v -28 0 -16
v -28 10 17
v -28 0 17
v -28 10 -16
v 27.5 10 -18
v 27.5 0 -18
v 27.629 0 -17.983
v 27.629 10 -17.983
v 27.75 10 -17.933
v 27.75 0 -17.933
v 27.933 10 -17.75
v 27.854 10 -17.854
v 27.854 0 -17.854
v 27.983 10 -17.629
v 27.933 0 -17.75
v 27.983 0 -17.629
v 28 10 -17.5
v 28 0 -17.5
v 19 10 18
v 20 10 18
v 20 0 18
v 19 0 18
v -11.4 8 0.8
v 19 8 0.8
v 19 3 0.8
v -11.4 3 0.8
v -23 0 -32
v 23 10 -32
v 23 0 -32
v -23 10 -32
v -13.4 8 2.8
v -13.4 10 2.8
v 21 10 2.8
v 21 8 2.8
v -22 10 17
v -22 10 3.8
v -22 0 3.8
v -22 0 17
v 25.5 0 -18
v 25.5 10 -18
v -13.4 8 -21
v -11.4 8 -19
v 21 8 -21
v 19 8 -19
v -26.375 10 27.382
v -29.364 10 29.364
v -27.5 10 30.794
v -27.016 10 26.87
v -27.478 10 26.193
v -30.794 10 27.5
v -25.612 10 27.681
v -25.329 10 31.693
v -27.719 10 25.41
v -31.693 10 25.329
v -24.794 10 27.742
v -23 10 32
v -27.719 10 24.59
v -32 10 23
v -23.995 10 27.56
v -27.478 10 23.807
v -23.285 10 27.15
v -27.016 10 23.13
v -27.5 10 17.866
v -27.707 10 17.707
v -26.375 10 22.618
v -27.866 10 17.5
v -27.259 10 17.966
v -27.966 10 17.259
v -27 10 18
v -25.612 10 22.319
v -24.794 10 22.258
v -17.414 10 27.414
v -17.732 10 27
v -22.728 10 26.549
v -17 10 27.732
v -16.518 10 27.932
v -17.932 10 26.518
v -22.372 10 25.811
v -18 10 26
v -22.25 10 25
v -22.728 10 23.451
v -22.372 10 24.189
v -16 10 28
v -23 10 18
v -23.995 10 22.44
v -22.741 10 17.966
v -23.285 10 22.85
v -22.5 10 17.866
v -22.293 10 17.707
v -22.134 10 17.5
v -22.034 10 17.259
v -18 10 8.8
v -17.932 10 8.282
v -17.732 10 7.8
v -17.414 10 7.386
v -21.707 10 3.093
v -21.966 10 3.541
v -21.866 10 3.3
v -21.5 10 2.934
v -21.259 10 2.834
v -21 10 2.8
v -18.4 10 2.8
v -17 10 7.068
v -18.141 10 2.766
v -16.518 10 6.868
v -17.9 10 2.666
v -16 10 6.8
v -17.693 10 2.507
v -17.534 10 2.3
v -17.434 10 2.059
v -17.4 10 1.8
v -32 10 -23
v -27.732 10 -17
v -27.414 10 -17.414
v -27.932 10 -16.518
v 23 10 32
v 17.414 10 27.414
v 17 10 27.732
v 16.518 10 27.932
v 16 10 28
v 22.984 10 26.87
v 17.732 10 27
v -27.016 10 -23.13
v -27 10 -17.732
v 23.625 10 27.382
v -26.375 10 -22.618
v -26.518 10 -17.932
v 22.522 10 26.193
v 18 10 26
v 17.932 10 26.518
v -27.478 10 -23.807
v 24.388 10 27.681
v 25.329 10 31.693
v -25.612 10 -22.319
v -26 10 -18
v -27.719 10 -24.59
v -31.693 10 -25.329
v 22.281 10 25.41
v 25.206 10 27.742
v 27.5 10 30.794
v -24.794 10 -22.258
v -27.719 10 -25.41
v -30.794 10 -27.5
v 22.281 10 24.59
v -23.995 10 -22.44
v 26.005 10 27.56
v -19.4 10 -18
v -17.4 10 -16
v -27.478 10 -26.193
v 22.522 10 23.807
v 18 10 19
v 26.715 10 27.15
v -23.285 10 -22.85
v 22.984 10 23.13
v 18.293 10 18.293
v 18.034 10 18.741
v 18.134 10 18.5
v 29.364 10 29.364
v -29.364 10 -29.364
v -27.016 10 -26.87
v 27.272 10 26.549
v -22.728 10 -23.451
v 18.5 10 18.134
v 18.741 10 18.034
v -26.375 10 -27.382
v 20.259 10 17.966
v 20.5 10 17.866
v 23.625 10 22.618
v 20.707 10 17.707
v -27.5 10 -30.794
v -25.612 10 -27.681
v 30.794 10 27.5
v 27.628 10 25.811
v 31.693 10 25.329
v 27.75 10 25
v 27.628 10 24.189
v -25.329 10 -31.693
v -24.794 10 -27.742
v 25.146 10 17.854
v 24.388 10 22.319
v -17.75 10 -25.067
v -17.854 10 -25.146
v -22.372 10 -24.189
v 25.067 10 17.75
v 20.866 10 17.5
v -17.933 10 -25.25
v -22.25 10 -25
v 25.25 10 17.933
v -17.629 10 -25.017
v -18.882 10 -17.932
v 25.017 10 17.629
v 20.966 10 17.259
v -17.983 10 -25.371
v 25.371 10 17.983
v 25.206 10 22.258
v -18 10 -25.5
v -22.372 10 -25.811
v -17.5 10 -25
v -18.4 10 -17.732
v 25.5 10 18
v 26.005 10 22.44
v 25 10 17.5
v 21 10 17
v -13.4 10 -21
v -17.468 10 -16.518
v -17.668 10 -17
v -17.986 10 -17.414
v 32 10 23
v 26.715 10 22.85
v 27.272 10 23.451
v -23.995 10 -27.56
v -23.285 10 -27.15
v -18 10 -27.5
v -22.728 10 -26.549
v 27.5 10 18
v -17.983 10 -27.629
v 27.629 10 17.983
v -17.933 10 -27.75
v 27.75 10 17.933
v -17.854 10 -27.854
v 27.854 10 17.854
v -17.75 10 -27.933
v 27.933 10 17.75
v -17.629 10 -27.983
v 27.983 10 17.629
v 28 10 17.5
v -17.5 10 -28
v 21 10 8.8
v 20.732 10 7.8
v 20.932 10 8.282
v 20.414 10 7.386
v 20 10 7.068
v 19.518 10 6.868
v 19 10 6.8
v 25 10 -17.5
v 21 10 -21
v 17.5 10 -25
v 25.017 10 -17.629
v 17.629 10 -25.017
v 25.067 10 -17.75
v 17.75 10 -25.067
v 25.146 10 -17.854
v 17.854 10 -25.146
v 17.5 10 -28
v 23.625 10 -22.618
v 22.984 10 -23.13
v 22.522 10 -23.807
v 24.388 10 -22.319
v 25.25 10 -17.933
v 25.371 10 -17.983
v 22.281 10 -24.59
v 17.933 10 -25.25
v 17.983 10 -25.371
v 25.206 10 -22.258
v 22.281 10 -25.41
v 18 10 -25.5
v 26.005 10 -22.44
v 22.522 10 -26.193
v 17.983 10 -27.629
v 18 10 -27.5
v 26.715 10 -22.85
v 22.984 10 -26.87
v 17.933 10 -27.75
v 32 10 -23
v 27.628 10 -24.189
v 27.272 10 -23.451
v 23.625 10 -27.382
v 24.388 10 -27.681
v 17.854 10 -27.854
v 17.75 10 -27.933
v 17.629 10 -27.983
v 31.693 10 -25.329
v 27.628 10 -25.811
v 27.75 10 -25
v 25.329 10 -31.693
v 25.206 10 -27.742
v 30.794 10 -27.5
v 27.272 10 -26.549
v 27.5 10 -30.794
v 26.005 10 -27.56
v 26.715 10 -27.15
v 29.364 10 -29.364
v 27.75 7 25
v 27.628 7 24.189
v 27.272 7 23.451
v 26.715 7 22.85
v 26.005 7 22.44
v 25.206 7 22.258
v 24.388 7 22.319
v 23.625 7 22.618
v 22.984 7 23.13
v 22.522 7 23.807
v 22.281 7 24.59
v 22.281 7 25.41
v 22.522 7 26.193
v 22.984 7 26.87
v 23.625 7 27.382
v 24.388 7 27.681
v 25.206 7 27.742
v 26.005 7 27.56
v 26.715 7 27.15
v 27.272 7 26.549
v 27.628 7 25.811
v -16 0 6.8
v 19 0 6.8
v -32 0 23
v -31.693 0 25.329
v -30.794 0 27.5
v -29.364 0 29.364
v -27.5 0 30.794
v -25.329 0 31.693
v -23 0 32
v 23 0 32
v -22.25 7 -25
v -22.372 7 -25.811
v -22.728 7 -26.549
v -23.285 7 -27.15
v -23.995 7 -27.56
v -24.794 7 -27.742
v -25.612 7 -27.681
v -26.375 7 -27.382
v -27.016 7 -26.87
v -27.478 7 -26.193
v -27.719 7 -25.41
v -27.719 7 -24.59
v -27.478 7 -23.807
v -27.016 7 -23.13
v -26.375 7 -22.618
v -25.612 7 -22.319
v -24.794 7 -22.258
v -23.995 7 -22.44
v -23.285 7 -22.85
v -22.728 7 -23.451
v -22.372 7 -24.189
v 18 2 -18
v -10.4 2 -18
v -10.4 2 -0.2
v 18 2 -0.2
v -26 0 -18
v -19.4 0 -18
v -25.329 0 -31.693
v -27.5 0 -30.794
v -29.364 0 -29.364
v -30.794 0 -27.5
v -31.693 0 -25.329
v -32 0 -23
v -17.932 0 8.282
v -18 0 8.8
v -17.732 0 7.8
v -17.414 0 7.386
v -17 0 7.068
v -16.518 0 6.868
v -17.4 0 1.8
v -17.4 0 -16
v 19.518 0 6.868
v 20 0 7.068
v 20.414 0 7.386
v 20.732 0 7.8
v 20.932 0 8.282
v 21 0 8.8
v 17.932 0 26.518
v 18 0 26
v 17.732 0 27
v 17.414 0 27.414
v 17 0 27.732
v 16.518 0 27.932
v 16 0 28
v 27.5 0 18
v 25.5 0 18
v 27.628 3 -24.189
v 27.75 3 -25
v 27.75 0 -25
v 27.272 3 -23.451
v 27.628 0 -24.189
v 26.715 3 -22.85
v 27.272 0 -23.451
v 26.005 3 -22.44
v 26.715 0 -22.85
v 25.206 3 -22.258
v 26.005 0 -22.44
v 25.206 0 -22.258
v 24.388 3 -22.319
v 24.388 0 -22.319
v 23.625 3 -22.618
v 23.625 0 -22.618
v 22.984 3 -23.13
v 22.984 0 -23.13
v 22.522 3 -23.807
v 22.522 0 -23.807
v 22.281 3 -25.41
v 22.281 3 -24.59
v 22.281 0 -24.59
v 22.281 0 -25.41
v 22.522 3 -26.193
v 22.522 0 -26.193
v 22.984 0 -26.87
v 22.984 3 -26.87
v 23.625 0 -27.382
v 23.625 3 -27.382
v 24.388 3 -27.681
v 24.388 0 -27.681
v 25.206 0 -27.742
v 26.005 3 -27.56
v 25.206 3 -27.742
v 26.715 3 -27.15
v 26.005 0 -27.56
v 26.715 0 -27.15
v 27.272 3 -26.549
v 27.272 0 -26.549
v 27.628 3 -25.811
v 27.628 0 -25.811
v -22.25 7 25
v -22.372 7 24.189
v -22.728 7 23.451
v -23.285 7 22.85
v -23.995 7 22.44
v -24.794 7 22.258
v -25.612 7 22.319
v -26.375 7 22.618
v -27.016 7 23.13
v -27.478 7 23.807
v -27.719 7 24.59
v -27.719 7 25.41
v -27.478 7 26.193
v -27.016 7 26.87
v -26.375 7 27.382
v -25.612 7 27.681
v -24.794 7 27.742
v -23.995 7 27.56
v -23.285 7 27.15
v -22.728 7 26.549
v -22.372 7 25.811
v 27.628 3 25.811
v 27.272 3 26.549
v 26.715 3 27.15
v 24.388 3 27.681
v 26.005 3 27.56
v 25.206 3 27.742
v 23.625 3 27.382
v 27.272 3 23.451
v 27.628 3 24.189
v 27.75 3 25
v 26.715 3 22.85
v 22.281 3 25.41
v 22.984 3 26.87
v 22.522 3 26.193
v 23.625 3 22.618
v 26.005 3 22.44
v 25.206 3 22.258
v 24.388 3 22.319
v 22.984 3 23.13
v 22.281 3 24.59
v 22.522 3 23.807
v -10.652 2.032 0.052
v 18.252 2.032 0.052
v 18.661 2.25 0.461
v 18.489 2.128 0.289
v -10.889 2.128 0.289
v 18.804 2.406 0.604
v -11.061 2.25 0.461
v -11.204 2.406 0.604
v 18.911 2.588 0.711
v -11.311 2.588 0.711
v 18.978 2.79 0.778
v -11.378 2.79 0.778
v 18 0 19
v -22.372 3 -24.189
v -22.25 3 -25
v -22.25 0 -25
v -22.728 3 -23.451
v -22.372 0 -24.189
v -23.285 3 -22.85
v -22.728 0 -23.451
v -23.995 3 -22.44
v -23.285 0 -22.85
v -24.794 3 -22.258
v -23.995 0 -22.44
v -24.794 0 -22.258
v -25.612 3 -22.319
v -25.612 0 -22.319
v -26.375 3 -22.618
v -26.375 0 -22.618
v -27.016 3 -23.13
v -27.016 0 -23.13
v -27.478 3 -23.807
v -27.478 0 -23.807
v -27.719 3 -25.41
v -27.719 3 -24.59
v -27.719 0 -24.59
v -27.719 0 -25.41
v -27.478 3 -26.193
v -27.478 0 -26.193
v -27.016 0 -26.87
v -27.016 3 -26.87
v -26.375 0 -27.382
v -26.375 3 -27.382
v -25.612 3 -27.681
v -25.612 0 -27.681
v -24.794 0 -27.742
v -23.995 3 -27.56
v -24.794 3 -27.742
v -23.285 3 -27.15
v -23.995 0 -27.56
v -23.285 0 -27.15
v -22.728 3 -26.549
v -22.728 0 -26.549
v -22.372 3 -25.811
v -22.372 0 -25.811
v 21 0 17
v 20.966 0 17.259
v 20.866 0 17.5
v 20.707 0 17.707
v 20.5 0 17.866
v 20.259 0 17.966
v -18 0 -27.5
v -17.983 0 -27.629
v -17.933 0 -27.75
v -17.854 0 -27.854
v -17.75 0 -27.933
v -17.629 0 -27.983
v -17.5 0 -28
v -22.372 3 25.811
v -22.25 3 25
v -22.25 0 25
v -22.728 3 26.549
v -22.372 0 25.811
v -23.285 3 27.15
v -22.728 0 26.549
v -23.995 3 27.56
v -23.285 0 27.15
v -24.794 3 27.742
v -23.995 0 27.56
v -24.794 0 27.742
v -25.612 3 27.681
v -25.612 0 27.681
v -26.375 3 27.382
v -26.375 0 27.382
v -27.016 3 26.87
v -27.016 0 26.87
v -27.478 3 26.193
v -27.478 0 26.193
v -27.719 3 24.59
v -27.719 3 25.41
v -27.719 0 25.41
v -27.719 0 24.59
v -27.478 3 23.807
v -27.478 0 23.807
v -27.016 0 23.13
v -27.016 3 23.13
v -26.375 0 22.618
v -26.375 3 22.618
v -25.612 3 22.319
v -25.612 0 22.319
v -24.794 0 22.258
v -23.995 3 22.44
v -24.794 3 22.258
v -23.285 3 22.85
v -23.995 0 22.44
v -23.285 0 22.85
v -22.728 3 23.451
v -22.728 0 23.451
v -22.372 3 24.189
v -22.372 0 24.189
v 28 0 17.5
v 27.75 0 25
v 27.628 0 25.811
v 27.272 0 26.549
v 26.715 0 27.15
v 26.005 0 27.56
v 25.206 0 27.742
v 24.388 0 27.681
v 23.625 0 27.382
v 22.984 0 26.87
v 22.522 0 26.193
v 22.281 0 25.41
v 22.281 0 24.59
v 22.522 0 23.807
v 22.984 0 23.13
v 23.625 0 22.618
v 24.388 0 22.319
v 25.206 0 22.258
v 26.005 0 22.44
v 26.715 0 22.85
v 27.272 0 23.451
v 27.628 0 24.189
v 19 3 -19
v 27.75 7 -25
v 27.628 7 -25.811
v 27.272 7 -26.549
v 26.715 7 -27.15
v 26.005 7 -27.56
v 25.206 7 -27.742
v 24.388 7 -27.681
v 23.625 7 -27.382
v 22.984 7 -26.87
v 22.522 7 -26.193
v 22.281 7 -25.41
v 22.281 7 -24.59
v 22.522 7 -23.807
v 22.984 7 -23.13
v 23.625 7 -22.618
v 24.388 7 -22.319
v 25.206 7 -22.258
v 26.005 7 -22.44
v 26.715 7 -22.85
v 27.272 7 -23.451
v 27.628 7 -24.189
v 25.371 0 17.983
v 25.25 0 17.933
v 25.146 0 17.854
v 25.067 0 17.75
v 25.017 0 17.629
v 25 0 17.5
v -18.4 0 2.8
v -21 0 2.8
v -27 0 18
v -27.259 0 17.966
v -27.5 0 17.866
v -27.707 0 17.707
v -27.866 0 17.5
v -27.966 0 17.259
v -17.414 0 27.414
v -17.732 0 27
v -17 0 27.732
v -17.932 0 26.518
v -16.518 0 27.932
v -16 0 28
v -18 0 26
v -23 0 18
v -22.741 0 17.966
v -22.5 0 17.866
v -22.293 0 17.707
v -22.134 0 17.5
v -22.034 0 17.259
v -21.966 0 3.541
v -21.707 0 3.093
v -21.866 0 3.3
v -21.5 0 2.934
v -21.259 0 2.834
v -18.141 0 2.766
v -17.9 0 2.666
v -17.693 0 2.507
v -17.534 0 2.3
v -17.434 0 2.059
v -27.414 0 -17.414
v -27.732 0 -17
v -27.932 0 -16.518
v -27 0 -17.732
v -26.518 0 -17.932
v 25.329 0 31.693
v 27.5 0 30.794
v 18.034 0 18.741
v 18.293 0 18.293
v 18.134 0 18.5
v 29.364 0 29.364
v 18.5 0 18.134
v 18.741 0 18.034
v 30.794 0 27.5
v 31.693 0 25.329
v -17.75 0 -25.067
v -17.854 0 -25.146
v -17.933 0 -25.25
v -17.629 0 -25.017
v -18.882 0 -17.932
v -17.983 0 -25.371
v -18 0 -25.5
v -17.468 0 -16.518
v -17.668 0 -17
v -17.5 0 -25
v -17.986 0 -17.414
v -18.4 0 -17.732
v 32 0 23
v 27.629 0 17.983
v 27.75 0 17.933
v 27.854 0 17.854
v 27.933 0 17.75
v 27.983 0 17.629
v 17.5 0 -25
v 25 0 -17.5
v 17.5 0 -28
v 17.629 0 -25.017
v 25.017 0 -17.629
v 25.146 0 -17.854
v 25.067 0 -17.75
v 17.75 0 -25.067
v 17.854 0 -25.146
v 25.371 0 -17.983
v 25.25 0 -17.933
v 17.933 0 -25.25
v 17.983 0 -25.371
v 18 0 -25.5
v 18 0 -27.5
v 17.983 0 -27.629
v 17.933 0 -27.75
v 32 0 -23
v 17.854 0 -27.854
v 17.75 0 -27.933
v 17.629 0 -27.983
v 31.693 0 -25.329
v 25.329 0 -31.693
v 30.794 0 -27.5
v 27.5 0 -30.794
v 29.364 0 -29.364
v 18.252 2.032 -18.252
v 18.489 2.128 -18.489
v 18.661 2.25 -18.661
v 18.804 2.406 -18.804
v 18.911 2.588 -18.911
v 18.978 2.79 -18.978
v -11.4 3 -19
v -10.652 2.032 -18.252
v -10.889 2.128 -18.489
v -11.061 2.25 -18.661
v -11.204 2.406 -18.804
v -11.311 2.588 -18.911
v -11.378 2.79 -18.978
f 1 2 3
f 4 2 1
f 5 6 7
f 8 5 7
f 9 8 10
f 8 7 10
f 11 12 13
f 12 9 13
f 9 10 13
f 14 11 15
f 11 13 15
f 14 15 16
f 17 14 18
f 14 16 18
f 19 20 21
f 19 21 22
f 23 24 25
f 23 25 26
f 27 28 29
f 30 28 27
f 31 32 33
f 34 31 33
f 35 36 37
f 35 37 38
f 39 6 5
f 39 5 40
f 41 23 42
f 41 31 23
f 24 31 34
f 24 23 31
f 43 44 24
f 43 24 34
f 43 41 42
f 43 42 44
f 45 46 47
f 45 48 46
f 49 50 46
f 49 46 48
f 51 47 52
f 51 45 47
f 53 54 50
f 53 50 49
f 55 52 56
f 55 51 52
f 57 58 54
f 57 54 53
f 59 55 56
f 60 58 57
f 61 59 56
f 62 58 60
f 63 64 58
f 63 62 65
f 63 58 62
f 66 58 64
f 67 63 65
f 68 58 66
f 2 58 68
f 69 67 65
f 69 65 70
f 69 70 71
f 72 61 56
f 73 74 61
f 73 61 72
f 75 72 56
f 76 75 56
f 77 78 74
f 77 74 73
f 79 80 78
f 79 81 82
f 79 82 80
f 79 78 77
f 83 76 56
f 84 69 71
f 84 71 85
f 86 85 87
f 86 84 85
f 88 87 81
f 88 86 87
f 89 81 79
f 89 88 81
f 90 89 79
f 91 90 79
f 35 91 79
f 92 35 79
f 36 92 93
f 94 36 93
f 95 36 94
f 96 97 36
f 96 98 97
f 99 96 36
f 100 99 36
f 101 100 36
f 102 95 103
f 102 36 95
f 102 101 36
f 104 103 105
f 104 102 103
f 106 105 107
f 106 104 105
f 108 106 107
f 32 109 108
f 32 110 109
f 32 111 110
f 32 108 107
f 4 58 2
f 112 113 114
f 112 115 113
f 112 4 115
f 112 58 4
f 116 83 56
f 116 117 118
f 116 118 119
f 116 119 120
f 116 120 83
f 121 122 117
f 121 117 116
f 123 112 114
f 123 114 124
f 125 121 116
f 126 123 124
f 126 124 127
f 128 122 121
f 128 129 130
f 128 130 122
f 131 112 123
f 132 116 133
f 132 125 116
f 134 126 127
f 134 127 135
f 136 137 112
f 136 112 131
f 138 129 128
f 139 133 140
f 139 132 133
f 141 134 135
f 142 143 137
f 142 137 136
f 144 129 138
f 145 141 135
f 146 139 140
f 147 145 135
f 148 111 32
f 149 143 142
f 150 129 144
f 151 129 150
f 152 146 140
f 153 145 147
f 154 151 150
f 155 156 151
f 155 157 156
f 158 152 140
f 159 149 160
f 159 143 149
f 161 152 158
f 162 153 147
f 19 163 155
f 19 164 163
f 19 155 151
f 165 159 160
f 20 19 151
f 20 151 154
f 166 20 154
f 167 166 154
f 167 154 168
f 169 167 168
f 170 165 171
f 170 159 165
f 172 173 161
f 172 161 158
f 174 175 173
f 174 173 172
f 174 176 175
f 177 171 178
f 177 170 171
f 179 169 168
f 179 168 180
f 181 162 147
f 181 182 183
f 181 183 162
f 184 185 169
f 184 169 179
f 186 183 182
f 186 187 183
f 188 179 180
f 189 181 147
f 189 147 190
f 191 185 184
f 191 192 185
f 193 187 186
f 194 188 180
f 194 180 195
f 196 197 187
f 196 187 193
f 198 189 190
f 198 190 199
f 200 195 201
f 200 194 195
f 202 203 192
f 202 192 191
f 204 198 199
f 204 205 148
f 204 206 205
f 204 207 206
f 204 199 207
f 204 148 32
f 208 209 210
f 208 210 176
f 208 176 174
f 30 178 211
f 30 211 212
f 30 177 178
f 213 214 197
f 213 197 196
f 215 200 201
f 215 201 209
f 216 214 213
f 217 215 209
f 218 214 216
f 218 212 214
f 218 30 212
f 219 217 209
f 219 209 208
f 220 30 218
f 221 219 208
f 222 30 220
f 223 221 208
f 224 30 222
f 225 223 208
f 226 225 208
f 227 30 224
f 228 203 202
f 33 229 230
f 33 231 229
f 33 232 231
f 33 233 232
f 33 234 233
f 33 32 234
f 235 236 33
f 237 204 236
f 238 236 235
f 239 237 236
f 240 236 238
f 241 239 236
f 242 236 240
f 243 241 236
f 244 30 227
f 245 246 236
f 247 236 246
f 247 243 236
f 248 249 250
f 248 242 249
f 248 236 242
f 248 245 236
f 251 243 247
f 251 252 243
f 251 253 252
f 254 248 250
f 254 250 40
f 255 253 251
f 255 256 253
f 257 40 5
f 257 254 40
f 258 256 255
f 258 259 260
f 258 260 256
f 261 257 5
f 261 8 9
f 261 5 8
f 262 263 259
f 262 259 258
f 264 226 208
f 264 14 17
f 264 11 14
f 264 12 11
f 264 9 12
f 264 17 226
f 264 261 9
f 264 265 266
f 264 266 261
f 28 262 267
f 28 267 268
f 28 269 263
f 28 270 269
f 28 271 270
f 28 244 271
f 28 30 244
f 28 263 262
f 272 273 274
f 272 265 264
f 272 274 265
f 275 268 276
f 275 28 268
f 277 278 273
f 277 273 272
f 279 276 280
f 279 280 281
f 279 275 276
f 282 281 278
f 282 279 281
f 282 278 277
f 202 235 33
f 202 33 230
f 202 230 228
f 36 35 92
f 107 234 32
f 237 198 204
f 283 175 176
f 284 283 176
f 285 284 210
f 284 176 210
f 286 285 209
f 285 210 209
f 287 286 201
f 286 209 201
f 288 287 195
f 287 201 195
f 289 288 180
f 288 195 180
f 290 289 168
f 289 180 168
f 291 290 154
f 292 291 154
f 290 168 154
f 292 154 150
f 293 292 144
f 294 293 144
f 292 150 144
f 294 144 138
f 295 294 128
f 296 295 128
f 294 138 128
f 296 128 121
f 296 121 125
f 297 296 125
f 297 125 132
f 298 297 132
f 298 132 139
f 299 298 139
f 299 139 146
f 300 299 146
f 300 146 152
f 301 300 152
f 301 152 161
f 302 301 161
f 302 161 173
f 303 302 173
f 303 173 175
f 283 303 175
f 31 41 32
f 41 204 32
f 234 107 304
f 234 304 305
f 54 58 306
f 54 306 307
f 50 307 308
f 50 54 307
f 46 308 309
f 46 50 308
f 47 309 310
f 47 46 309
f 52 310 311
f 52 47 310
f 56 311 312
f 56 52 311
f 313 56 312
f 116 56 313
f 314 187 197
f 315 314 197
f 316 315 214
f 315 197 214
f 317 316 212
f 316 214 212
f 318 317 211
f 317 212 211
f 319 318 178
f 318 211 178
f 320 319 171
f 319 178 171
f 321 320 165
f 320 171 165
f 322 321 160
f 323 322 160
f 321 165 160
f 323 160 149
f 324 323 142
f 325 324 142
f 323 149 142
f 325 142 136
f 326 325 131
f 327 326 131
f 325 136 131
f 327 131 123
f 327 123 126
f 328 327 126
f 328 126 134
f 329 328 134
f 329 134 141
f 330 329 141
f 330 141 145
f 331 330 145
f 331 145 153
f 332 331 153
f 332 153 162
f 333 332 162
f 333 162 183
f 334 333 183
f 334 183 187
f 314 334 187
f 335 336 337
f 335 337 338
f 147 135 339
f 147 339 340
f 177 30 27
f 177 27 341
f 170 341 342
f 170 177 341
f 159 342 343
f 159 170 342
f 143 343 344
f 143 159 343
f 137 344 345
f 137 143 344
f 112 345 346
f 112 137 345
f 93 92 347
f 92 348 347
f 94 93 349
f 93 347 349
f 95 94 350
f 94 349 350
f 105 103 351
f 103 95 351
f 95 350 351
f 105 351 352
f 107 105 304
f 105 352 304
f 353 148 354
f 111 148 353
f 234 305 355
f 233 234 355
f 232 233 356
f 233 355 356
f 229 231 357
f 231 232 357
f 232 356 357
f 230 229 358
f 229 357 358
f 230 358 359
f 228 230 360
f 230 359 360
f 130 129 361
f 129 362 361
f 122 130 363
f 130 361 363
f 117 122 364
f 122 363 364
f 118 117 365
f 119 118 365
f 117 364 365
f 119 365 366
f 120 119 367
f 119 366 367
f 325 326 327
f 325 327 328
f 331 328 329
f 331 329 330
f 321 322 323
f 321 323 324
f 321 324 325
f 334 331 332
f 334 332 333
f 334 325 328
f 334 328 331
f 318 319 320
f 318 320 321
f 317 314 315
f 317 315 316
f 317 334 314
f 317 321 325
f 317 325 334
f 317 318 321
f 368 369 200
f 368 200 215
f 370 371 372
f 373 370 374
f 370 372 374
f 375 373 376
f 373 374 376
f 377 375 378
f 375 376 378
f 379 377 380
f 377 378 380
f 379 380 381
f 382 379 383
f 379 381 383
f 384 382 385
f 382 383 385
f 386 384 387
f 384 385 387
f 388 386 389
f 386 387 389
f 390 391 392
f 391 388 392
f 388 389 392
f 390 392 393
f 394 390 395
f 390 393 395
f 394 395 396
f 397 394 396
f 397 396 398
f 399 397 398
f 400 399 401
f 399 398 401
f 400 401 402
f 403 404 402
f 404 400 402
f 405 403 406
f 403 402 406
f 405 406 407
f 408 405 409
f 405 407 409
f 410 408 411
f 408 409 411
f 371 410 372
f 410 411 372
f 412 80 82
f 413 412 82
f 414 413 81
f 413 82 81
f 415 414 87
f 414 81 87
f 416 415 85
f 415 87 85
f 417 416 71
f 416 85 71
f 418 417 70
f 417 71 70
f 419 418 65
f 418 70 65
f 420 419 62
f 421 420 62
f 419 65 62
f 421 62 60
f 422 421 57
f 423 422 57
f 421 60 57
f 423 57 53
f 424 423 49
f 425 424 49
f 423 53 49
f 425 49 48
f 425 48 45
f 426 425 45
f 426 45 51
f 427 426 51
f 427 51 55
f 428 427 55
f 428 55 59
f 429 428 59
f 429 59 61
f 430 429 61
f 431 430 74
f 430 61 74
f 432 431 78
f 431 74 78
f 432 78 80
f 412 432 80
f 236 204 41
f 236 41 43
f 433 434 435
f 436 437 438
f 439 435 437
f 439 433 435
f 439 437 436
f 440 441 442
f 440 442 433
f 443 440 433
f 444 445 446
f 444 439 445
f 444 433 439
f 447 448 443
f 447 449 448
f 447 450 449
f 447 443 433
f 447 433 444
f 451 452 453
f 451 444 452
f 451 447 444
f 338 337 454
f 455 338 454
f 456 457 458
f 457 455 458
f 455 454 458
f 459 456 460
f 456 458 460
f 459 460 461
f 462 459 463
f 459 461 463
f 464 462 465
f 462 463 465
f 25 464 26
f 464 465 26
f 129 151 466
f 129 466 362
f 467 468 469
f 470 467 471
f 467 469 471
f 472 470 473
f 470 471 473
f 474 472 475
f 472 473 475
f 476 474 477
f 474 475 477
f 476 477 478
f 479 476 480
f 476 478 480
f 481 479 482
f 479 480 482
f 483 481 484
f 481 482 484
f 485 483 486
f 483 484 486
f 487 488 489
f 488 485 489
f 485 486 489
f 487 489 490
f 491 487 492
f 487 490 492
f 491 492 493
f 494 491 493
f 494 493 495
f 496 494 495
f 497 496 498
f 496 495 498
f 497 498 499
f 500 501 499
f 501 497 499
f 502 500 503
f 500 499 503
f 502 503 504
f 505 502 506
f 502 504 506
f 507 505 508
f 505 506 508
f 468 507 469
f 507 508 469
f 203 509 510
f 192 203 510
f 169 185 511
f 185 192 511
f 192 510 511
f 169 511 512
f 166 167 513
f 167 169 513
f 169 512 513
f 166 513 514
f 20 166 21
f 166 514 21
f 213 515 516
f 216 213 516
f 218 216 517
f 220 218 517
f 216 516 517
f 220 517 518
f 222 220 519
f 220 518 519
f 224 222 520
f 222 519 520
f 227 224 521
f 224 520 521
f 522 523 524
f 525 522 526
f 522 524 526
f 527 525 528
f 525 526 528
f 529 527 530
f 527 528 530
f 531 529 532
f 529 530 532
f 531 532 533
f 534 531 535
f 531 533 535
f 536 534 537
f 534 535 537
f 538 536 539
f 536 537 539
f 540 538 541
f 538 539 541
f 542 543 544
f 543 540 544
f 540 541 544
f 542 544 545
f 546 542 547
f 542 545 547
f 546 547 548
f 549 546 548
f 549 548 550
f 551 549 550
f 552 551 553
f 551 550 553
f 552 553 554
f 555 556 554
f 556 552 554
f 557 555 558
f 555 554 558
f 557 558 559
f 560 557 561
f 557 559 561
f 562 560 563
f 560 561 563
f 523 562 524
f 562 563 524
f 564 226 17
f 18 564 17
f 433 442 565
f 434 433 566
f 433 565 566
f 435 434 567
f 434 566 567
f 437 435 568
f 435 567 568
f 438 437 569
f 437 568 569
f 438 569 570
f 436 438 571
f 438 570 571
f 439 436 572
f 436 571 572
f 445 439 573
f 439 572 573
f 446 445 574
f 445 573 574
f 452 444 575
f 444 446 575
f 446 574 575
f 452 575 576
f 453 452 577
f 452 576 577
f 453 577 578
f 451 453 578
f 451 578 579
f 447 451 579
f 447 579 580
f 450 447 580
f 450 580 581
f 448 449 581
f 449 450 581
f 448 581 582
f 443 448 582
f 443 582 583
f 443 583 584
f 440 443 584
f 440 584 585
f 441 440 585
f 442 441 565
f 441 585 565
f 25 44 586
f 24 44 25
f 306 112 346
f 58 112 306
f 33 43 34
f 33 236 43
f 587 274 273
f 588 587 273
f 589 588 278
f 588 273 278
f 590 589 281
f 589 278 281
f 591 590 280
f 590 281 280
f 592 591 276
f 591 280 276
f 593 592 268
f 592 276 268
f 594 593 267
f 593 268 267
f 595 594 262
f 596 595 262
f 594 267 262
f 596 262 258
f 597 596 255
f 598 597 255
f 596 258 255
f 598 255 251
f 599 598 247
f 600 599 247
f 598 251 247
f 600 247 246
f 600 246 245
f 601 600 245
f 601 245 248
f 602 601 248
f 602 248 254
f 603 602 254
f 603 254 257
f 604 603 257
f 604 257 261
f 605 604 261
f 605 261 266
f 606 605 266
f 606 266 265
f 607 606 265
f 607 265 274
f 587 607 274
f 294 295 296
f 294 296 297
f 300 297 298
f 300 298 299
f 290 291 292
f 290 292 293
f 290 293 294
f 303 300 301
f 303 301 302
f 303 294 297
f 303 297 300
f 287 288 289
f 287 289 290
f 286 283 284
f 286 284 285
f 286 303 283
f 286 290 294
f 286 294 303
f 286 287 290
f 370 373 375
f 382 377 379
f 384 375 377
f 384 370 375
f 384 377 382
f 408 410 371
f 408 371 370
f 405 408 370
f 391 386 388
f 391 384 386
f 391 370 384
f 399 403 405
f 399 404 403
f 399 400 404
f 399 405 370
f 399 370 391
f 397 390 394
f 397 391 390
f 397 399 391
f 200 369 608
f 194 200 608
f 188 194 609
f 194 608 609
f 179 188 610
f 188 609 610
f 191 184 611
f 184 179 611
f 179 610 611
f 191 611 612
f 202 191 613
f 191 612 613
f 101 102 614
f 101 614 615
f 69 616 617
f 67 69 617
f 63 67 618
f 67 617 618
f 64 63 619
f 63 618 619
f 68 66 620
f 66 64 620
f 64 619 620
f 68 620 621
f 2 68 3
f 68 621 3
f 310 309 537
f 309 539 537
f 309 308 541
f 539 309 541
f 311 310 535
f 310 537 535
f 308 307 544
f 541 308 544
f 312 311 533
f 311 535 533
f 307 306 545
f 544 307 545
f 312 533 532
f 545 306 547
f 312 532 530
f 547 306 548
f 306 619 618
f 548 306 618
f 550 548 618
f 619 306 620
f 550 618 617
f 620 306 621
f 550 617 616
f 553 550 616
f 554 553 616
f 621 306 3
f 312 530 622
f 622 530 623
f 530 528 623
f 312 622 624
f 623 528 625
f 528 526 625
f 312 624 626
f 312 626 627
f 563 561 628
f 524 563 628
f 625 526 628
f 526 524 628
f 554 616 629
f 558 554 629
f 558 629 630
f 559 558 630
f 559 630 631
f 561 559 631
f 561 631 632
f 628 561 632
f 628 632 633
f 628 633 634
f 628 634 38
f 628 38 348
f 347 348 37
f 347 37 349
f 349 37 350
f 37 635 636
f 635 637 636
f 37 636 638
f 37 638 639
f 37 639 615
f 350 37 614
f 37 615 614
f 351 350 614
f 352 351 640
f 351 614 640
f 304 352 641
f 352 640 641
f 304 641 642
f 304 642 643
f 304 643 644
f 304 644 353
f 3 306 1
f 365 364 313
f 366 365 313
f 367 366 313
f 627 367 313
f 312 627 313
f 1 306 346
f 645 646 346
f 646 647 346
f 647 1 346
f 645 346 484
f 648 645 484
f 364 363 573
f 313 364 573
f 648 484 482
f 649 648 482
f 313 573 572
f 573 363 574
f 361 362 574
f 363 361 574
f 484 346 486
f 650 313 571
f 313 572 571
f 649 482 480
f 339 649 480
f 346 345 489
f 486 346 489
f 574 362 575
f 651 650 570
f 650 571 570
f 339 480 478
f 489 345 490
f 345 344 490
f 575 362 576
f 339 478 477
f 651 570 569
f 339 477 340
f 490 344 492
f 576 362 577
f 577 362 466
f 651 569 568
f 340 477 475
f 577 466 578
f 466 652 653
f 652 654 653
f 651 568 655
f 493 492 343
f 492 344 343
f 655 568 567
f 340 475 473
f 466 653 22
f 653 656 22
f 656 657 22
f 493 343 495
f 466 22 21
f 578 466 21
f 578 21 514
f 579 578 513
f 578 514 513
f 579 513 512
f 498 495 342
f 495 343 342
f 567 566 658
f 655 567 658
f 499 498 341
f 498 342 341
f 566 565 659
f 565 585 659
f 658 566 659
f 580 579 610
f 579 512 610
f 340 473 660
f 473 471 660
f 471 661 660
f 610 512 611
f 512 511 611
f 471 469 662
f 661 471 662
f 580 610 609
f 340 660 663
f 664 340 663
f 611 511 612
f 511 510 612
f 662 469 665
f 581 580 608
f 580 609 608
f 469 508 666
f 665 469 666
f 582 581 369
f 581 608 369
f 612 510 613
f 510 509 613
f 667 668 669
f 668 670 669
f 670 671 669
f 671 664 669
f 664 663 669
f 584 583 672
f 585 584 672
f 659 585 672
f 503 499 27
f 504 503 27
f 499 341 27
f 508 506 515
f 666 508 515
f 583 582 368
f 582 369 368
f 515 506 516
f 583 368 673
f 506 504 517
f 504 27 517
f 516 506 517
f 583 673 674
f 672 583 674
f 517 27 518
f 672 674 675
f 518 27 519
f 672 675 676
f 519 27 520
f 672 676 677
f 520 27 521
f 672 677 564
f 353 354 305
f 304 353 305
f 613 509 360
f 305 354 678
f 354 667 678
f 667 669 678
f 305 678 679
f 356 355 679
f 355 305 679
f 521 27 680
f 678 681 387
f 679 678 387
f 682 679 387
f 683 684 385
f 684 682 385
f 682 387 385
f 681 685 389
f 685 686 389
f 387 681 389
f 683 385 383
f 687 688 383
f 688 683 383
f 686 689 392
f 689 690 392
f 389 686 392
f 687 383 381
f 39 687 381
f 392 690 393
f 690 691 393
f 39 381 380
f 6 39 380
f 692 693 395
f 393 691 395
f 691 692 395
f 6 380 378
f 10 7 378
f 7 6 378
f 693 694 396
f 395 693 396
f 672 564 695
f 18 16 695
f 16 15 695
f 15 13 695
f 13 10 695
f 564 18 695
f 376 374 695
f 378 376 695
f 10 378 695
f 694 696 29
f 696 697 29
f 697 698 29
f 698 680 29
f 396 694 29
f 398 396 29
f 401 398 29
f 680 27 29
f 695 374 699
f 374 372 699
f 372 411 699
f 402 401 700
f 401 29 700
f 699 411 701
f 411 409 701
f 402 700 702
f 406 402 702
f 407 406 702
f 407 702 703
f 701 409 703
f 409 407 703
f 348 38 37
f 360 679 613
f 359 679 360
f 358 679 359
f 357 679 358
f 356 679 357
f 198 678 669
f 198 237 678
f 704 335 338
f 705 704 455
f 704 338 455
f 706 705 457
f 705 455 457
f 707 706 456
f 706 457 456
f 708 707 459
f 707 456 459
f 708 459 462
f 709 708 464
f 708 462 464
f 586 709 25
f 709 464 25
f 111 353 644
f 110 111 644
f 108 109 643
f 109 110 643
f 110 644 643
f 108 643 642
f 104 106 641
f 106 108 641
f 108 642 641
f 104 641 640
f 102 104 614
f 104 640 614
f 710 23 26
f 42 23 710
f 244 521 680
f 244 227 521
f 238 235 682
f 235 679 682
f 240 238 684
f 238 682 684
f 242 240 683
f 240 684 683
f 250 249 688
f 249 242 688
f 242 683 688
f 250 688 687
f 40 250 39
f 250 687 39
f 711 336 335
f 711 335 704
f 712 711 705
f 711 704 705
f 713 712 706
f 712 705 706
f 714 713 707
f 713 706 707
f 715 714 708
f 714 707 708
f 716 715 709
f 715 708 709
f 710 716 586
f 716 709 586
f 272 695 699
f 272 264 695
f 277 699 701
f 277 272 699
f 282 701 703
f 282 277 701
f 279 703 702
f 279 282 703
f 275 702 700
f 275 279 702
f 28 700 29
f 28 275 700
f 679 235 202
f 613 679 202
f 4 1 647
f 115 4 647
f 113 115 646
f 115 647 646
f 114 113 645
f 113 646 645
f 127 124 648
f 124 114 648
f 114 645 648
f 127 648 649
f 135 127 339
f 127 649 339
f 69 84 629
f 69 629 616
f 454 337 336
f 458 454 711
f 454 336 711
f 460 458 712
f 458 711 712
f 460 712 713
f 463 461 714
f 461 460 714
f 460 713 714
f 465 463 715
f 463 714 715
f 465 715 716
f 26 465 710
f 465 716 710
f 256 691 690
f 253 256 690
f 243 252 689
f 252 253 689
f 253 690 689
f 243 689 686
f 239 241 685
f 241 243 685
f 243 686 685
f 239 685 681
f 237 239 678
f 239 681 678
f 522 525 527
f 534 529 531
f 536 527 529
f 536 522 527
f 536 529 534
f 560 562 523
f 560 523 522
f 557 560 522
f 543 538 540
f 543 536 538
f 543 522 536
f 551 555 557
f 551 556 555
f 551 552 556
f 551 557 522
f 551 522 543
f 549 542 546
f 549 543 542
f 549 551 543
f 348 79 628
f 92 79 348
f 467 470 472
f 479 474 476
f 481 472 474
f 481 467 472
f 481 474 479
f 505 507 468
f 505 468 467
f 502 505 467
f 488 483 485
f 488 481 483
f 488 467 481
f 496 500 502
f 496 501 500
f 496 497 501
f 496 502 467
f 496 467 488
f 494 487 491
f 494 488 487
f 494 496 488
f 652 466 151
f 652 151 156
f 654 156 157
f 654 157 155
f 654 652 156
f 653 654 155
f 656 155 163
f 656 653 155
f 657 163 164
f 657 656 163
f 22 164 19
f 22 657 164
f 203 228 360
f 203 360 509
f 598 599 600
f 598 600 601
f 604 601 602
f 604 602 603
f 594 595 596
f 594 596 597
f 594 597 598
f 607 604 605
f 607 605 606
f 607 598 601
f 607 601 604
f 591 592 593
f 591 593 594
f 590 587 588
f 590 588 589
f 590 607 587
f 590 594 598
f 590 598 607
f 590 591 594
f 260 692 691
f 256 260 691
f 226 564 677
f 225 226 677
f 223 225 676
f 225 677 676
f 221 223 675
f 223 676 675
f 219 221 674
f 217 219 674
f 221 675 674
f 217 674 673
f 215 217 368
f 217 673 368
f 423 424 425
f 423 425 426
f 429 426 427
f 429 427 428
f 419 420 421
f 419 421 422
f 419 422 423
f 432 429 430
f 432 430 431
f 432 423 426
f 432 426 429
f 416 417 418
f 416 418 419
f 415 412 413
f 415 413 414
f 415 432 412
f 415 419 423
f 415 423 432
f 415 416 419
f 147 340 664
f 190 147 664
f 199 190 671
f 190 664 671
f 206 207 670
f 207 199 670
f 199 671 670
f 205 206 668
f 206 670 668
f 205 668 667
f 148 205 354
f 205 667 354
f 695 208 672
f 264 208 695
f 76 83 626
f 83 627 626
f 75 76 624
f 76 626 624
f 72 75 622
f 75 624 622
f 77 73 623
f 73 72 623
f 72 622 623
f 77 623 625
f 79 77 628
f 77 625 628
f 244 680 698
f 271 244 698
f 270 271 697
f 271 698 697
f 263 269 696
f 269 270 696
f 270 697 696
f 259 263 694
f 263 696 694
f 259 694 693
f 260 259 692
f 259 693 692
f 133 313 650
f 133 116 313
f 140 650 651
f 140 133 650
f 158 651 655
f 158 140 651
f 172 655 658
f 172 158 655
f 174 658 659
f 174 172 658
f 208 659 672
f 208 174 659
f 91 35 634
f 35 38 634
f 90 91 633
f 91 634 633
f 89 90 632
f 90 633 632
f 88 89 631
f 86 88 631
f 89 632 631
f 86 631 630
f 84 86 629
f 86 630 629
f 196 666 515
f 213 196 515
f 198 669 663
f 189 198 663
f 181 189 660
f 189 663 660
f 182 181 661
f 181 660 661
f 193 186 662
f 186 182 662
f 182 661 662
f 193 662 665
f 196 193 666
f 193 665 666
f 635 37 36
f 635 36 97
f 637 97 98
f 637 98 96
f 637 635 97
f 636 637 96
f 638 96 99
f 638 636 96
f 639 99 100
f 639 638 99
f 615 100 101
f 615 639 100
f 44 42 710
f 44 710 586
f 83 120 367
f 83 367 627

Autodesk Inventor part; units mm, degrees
ref_plane "YZ Plane" through (0, 0, 0) normal (1, 0, 0) x (0, 1, 0)
ref_plane "XZ Plane" through (0, 0, 0) normal (0, 1, 0) x (-1, 0, 0)
sketch "Sketch1" plane through (0, 0, 0) normal (0, 1, 0) x (-1, 0, 0)
  line L0 (30, 30) -> (-30, 30)
  line L1 (-30, 30) -> (-30, -30)
  line L2 (-30, -30) -> (30, -30)
  line L3 (30, -30) -> (30, 30)
  line L4 (30, 30) -> (-30, -30) construction
  line L5 (-30, 30) -> (30, -30) construction
  point P0 (0, 0)
  dimension "d0" = 60
  dimension "d1" = 60
extrude "Extrusion1" add sketch "Sketch1" along normal blind 10
fillet "Fillet1" radius 7 4 edges at (30, 5, 30) (30, 5, -30) (-30, 5, 30) (-30, 5, -30)
sketch "Sketch2" plane through (0, 10, 0) normal (0, 1, 0) x (1, 0, 0)
  line L0 (-30, 30) -> (30, 30)
  line L1 (30, 30) -> (30, -30)
  line L2 (30, -30) -> (-30, -30)
  line L3 (-30, -30) -> (-30, 30)
  line L4 (-30, 30) -> (30, -30) construction
  line L5 (30, 30) -> (-30, -30) construction
  line L6 (25, -25) -> (25, 25)
  line L7 (25, 25) -> (-25, 25)
  line L8 (-25, 25) -> (-25, -25)
  line L9 (-25, -25) -> (25, -25)
  circle A0 centre (25, -25) radius 2.75
  circle A1 centre (-25, -25) radius 2.75
  circle A2 centre (25, 25) radius 2.75
  circle A3 centre (-25, 25) radius 2.75
  point P0 (0, 0)
  dimension "d5" = 5
  dimension "d6" = 5.5
  dimension "d7" = 5.5
  dimension "d8" = 5.5
  dimension "d9" = 5.5
extrude "Extrusion2" cut sketch "Sketch2" against normal blind 3 contours L9 A0 L6 | L6 A0 L9 | A2 L7 L6 | L6 L7 A2 | A1 L8 L9 | L9 L8 A1 | A3 L8 L7 | L7 L8 A3
sketch "Sketch7" plane through (0, 10, 0) normal (0, 1, 0) x (1, 0, 0)
  line L0 (-23, 30) -> (23, 30)
  line L1 (30, 23) -> (30, -23)
  line L2 (23, -30) -> (-23, -30)
  line L3 (-30, -23) -> (-30, 23)
  line L4 (-30, 30) -> (30, -30) construction
  line L5 (30, 30) -> (-30, -30) construction
  arc A0 (-23, 30) -> (-30, 23) centre (-23, 23) ccw
  arc A1 (-30, -23) -> (-23, -30) centre (-23, -23) ccw
  arc A2 (23, -30) -> (30, -23) centre (23, -23) ccw
  arc A3 (30, 23) -> (23, 30) centre (23, 23) ccw
  line L6 (23, 32) -> (-23, 32)
  arc A4 (-23, 32) -> (-32, 23) centre (-23, 23) ccw
  line L7 (-32, 23) -> (-32, -23)
  arc A5 (-32, -23) -> (-23, -32) centre (-23, -23) ccw
  line L8 (-23, -32) -> (23, -32)
  arc A6 (23, -32) -> (32, -23) centre (23, -23) ccw
  line L9 (32, -23) -> (32, 23)
  arc A7 (32, 23) -> (23, 32) centre (23, 23) ccw
  point P0 (0, 0)
  dimension "d47" = 7
  dimension "d48" = 2
extrude "Extrusion6" add sketch "Sketch7" against normal blind 10
sketch "Sketch30" plane through (0, 10, 0) normal (0, 1, 0) x (1, 0, 0)
  line L0 (-25, -25) -> (25, -25)
  line L1 (25, -25) -> (25, 25)
  line L2 (25, 25) -> (-25, 25)
  line L3 (-25, 25) -> (-25, -25)
  line L4 (-25, -25) -> (25, 25) construction
  line L5 (25, -25) -> (-25, 25) construction
  line L6 (21, 21) -> (21, -21)
  line L7 (21, -21) -> (-21, -21)
  line L8 (-21, -21) -> (-21, 21)
  line L9 (-21, 21) -> (21, 21)
  line L10 (-13.4, 21) -> (-13.4, -2.8)
  line L11 (-13.4, -2.8) -> (21, -2.8)
  line L12 (19, -19) -> (-19, -19)
  line L13 (-19, -19) -> (-19, 19)
  line L14 (-11.4, 19) -> (-11.4, -0.8)
  line L15 (-11.4, -0.8) -> (19, -0.8)
  line L16 (-11.4, 19) -> (19, 19)
  line L17 (19, 19) -> (19, -0.8)
  point P0 (0, 0)
  dimension "d307" = 50
  dimension "d308" = 50
  dimension "d309" = 4
  dimension "d310" = 34.4
  dimension "d311" = 23.8
  dimension "d313" = 2
extrude "Extrusion28" cut sketch "Sketch30" against normal blind 2 contours L6 L11 L10 L9
sketch "Sketch31" plane through (0, 10, 0) normal (0, 1, 0) x (1, 0, 0)
  line L0 (-11.4, 19) -> (19, 19)
  line L1 (19, 19) -> (19, -0.8)
  line L2 (19, -0.8) -> (-11.4, -0.8)
  line L3 (-11.4, -0.8) -> (-11.4, 19)
  point P0 (0, 0)
extrude "Extrusion29" cut sketch "Sketch31" against normal blind 8
sketch "Sketch32" plane through (0, 10, 0) normal (0, 1, 0) x (1, 0, 0)
  line L0 (32, -23) -> (32, 23) projected
  line L1 (23, 32) -> (-23, 32) projected
  line L2 (-13.4, 21) -> (21, 21) projected
  line L3 (-32, 23) -> (-32, -23) projected
  line L4 (-18, 28) -> (18, 28)
  line L5 (18, 28) -> (18, 25)
  line L6 (18, 25) -> (-18, 25)
  line L7 (-18, 25) -> (-18, 28)
  line L8 (-23, -32) -> (23, -32) projected
  line L9 (21, 21) -> (21, -2.8) projected
  line L10 (28, 18) -> (25, 18)
  line L11 (25, 18) -> (25, -18)
  line L12 (25, -18) -> (28, -18)
  line L13 (28, -18) -> (28, 18)
  line L14 (21, -2.8) -> (-13.4, -2.8) projected
  line L15 (18, -28) -> (-18, -28)
  line L16 (-18, -28) -> (-18, -6.8)
  line L17 (-18, -6.8) -> (21, -6.8)
  line L18 (21, -6.8) -> (21, -18)
  line L19 (21, -18) -> (18, -18)
  line L20 (18, -18) -> (18, -28)
  line L21 (-13.4, -2.8) -> (-13.4, 21) projected
  line L22 (-22, -18) -> (-28, -18)
  line L23 (-28, -18) -> (-28, 18)
  line L24 (-28, 18) -> (-17.4, 18)
  line L25 (-17.4, 18) -> (-17.4, -2.8)
  line L26 (-17.4, -2.8) -> (-22, -2.8)
  line L27 (-22, -2.8) -> (-22, -18)
  point P0 (0, 0)
  dimension "d318" = 14
  dimension "d319" = 4
  dimension "d320" = 4
  dimension "d321" = 4
  dimension "d322" = 14
  dimension "d323" = 4
  dimension "d324" = 14
  dimension "d325" = 4
  dimension "d326" = 14
  dimension "d327" = 4
  dimension "d328" = 14
  dimension "d329" = 4
  dimension "d330" = 4
  dimension "d331" = 4
  dimension "d332" = 14
  dimension "d333" = 4
  dimension "d334" = 14
  dimension "d335" = 4
  dimension "d336" = 14
  dimension "d337" = 4
  dimension "d338" = 4
  dimension "d339" = 4
  dimension "d341" = 4
  dimension "d342" = 14
  dimension "d343" = 14
extrude "Extrusion30" cut sketch "Sketch32" against normal through all contours L4 L5 L6 L7 | L13 L12 L11 L10 | L15 L16 L17 L18 L19 L20 | L22 L23 L24 L25 L26 L27
fillet "Fillet9" radius 0.5 8 edges at (-18, 5, -28) (25, 5, -18) (25, 5, 18) (-18, 5, -25) (18, 5, -25) (28, 5, 18) (18, 5, -28) (28, 5, -18)
fillet "Fillet9" radius 1 10 edges at (3.8, 2, -19) (3.8, 2, 0.8) (19, 2, -9.1) (-11.4, 2, -9.1) (18, 5, 18) (21, 5, 18) (-22, 5, 2.8) (-17.4, 5, 2.8) (-22, 5, 18) (-28, 5, 18)
fillet "Fillet9" radius 2 6 edges at (-28, 5, -18) (-17.4, 5, -18) (21, 5, 6.8) (-18, 5, 28) (-18, 5, 6.8) (18, 5, 28)
ref_plane "Work Plane8" through (0, 5, 0) normal (0, 1, 0) x (1, 0, 0)
mirror "Mirror8" about plane through (0, 5, 0) normal (0, 1, 0) of "Extrusion2"
properties part number "8 pin long"
